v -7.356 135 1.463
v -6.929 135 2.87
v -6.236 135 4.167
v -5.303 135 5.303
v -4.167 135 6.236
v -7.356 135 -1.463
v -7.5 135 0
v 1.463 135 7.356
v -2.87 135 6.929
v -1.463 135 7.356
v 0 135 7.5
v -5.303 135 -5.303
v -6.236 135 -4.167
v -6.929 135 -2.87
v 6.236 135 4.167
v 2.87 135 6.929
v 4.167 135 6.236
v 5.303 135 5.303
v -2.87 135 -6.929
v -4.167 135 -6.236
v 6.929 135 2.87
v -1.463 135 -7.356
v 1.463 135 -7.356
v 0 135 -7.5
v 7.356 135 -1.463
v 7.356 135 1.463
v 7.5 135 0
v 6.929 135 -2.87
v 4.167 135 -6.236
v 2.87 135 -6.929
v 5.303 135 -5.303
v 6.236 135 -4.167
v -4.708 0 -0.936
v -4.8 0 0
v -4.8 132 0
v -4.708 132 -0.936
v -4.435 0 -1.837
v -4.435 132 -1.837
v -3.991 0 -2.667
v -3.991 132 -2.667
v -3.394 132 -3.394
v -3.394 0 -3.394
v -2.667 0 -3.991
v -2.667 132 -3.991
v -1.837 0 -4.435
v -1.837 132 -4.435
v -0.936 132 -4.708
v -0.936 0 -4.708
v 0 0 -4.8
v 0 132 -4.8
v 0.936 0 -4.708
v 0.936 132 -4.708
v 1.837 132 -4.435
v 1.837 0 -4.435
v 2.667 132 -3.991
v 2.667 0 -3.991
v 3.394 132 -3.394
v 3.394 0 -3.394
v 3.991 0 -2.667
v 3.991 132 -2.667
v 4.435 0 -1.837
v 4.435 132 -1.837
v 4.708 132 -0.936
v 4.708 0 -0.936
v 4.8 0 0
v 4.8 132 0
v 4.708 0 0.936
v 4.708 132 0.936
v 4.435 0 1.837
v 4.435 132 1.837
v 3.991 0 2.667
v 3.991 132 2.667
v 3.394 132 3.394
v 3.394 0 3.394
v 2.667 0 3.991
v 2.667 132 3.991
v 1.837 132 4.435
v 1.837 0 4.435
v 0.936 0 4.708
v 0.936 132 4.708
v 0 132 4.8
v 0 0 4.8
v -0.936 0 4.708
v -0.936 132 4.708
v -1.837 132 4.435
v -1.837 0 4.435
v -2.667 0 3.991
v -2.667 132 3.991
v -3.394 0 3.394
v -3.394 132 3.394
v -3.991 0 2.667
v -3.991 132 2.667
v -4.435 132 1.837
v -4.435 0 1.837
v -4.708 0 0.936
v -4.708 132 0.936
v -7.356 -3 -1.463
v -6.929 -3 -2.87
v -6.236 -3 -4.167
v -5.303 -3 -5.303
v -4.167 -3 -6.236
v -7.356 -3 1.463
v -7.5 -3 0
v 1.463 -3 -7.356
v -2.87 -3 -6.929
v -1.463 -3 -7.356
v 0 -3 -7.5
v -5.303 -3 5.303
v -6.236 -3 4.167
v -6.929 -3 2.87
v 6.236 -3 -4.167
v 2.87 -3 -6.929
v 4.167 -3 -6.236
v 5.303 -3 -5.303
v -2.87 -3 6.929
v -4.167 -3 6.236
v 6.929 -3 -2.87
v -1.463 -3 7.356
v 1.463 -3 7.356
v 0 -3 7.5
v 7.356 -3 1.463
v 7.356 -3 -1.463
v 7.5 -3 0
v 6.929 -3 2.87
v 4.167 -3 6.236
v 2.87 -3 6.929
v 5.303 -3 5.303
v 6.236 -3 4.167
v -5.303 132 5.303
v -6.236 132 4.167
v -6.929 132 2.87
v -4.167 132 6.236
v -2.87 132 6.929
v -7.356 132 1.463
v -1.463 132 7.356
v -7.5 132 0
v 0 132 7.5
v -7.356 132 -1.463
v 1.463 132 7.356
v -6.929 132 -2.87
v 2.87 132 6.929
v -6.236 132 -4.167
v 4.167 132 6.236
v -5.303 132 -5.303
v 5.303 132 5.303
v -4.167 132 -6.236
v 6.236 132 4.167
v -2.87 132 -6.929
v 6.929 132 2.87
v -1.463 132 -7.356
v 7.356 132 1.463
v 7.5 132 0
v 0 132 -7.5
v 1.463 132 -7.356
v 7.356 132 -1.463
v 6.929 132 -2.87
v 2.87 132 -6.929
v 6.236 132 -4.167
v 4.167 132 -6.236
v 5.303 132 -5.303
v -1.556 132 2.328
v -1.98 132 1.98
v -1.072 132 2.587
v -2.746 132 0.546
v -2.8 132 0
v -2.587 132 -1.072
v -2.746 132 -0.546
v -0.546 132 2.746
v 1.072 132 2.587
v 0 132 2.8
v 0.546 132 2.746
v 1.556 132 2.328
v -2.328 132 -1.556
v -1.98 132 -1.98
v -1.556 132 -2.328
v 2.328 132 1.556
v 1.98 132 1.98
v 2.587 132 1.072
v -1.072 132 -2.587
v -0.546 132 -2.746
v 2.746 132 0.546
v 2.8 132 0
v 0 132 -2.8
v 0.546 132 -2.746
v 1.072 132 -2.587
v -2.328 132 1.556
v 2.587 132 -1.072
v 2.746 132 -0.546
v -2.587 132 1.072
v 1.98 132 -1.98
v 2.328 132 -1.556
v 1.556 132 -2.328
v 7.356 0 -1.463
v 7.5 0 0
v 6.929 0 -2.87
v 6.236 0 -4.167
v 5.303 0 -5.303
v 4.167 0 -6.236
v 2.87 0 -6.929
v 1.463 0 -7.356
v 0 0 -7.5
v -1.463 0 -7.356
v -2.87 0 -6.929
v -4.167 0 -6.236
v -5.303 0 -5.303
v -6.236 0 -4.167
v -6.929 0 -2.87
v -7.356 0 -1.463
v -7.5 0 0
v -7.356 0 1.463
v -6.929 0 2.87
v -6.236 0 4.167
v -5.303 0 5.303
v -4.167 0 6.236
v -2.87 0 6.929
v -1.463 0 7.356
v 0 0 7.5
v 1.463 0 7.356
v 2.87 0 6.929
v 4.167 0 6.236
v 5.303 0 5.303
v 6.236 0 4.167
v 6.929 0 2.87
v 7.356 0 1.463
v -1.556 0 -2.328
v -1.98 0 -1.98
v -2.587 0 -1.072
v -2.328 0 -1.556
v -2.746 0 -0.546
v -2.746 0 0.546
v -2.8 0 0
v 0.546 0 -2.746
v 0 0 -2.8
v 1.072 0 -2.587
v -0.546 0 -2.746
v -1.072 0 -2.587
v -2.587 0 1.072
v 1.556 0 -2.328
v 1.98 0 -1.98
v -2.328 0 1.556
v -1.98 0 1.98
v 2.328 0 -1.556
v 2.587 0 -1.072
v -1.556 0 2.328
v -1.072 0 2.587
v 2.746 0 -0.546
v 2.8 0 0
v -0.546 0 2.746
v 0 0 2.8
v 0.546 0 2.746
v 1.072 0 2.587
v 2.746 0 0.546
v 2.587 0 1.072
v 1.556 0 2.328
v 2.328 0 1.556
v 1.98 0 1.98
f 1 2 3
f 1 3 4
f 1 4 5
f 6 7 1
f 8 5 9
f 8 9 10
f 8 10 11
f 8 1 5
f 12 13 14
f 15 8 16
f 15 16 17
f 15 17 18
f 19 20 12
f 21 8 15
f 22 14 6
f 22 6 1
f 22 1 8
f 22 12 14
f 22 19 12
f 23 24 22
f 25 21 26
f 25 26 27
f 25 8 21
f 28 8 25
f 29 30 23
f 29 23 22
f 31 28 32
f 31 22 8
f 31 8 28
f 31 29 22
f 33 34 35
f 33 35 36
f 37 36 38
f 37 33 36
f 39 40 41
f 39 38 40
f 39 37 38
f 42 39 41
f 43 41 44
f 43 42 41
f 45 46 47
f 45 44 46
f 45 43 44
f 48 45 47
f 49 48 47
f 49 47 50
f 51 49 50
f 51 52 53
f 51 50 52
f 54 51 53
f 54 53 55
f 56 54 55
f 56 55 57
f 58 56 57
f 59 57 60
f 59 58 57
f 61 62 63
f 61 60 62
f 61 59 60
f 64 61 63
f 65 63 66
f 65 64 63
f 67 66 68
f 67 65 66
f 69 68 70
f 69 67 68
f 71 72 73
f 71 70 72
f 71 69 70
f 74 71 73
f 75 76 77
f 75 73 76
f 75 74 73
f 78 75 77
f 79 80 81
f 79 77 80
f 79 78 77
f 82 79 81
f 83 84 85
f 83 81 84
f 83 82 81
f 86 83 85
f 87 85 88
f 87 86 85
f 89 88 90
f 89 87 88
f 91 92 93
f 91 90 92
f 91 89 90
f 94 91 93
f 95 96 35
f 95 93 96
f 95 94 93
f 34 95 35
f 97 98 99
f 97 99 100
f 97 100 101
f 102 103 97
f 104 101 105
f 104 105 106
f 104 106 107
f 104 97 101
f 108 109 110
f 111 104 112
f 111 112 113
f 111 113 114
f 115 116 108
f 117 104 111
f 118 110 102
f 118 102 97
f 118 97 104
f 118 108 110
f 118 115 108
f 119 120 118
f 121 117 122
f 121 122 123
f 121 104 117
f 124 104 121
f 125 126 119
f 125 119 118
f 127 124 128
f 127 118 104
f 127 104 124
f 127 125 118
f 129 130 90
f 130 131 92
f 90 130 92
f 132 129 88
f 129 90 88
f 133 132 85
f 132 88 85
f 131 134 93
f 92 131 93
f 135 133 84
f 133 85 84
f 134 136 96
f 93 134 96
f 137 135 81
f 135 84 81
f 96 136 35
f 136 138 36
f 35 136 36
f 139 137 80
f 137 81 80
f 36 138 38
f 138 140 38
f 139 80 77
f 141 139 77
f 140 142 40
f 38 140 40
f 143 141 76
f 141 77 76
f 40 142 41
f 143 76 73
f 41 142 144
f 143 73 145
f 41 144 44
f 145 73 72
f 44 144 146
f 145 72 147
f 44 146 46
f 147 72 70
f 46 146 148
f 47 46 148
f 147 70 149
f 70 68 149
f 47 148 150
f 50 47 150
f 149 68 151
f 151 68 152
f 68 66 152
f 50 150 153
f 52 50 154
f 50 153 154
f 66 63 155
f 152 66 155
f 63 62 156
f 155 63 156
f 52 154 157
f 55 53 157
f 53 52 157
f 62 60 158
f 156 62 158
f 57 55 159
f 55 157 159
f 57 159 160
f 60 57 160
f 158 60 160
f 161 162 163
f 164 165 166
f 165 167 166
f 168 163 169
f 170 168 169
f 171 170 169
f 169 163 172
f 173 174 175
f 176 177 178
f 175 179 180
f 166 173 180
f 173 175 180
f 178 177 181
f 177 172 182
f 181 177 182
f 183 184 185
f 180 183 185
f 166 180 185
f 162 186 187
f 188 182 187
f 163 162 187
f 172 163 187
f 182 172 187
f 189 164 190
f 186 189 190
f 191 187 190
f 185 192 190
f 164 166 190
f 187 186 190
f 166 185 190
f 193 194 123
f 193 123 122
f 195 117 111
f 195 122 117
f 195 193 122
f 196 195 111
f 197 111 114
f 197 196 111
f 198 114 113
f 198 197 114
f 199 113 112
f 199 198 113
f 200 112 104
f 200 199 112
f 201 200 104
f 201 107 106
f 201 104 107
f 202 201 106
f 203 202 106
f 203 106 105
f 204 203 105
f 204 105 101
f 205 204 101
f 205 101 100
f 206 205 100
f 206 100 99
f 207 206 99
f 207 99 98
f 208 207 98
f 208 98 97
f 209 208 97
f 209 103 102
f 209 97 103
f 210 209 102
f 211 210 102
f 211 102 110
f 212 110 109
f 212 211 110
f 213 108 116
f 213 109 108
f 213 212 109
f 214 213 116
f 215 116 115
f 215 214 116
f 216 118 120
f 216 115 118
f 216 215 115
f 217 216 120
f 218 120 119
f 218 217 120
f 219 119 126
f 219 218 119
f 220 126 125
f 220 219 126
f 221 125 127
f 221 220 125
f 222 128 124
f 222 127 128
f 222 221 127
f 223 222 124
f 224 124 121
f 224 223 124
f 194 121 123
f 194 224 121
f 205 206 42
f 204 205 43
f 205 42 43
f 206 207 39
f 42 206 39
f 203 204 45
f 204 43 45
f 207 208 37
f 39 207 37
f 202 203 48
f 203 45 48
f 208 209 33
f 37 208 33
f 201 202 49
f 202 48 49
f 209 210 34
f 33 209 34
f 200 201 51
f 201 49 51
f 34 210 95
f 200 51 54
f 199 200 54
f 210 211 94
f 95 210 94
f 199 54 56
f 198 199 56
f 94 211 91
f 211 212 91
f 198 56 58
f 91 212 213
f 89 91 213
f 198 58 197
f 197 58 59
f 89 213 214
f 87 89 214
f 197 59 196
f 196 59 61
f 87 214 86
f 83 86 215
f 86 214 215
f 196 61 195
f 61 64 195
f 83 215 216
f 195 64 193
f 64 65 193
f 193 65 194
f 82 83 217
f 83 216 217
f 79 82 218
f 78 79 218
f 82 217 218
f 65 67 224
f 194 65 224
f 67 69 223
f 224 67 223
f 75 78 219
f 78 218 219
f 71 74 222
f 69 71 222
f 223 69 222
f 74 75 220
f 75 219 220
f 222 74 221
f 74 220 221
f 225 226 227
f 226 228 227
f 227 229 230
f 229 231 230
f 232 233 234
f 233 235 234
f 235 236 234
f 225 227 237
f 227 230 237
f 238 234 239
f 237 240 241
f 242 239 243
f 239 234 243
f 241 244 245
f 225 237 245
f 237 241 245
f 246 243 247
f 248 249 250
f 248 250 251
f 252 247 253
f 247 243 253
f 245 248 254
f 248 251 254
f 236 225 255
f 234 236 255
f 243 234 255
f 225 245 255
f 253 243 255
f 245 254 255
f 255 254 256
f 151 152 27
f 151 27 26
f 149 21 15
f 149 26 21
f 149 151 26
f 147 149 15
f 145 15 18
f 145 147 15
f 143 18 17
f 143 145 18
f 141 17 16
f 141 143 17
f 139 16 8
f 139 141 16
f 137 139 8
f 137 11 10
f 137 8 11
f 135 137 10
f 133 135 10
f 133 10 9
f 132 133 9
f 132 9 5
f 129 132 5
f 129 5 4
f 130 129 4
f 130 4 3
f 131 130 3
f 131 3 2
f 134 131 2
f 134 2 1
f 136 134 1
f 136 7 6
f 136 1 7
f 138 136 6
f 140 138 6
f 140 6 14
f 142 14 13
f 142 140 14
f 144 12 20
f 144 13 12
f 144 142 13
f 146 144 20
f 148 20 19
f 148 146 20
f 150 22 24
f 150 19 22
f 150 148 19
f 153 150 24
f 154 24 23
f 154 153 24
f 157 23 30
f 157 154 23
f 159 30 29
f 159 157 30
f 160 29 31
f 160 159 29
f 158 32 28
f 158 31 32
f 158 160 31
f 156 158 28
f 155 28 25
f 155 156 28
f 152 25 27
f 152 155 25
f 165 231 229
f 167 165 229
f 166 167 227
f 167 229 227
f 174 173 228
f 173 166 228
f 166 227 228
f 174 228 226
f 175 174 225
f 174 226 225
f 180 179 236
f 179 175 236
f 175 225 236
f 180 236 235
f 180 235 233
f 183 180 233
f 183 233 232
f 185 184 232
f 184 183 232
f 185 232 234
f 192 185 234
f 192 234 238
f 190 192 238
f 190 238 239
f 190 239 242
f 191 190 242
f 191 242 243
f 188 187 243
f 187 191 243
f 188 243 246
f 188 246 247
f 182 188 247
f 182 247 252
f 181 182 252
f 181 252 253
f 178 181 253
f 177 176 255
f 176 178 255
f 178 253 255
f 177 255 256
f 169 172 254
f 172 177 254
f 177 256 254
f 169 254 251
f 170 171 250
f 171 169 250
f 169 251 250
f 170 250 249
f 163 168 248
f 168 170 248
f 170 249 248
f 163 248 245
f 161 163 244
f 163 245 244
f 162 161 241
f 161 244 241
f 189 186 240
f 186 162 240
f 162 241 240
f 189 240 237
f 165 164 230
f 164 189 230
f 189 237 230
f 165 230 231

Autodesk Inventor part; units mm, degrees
ref_plane "YZ Plane" through (0, 0, 0) normal (1, 0, 0) x (0, 1, 0)
ref_plane "XZ Plane" through (0, 0, 0) normal (0, 1, 0) x (-1, 0, 0)
ref_plane "XY Plane" through (0, 0, 0) normal (0, 0, 1) x (1, 0, 0)
sketch "Boceto1" plane through (0, 0, 0) normal (0, 1, 0) x (-1, 0, 0)
  circle A0 centre (0, 0) radius 4.8
  circle A1 centre (0, 0) radius 2.8
  dimension "d0" = 9.6
  dimension "d1" = 2
extrude "Extrusión1" add sketch "Boceto1" along normal blind 132
sketch "Boceto2" plane through (0, 132, 0) normal (0, 1, 0) x (1, 0, 0)
  circle A0 centre (0, 0) radius 7.5
  dimension "d4" = 15
extrude "Extrusión2" add sketch "Boceto2" along normal blind 3
sketch "Boceto3" plane through (0, 0, 0) normal (0, -1, 0) x (1, 0, 0)
  circle A0 centre (0, 0) radius 7.5
  dimension "d7" = 15
extrude "Extrusión3" add sketch "Boceto3" along normal blind 3
properties part number "Asiento - Manija" material "Aluminio 6061"
